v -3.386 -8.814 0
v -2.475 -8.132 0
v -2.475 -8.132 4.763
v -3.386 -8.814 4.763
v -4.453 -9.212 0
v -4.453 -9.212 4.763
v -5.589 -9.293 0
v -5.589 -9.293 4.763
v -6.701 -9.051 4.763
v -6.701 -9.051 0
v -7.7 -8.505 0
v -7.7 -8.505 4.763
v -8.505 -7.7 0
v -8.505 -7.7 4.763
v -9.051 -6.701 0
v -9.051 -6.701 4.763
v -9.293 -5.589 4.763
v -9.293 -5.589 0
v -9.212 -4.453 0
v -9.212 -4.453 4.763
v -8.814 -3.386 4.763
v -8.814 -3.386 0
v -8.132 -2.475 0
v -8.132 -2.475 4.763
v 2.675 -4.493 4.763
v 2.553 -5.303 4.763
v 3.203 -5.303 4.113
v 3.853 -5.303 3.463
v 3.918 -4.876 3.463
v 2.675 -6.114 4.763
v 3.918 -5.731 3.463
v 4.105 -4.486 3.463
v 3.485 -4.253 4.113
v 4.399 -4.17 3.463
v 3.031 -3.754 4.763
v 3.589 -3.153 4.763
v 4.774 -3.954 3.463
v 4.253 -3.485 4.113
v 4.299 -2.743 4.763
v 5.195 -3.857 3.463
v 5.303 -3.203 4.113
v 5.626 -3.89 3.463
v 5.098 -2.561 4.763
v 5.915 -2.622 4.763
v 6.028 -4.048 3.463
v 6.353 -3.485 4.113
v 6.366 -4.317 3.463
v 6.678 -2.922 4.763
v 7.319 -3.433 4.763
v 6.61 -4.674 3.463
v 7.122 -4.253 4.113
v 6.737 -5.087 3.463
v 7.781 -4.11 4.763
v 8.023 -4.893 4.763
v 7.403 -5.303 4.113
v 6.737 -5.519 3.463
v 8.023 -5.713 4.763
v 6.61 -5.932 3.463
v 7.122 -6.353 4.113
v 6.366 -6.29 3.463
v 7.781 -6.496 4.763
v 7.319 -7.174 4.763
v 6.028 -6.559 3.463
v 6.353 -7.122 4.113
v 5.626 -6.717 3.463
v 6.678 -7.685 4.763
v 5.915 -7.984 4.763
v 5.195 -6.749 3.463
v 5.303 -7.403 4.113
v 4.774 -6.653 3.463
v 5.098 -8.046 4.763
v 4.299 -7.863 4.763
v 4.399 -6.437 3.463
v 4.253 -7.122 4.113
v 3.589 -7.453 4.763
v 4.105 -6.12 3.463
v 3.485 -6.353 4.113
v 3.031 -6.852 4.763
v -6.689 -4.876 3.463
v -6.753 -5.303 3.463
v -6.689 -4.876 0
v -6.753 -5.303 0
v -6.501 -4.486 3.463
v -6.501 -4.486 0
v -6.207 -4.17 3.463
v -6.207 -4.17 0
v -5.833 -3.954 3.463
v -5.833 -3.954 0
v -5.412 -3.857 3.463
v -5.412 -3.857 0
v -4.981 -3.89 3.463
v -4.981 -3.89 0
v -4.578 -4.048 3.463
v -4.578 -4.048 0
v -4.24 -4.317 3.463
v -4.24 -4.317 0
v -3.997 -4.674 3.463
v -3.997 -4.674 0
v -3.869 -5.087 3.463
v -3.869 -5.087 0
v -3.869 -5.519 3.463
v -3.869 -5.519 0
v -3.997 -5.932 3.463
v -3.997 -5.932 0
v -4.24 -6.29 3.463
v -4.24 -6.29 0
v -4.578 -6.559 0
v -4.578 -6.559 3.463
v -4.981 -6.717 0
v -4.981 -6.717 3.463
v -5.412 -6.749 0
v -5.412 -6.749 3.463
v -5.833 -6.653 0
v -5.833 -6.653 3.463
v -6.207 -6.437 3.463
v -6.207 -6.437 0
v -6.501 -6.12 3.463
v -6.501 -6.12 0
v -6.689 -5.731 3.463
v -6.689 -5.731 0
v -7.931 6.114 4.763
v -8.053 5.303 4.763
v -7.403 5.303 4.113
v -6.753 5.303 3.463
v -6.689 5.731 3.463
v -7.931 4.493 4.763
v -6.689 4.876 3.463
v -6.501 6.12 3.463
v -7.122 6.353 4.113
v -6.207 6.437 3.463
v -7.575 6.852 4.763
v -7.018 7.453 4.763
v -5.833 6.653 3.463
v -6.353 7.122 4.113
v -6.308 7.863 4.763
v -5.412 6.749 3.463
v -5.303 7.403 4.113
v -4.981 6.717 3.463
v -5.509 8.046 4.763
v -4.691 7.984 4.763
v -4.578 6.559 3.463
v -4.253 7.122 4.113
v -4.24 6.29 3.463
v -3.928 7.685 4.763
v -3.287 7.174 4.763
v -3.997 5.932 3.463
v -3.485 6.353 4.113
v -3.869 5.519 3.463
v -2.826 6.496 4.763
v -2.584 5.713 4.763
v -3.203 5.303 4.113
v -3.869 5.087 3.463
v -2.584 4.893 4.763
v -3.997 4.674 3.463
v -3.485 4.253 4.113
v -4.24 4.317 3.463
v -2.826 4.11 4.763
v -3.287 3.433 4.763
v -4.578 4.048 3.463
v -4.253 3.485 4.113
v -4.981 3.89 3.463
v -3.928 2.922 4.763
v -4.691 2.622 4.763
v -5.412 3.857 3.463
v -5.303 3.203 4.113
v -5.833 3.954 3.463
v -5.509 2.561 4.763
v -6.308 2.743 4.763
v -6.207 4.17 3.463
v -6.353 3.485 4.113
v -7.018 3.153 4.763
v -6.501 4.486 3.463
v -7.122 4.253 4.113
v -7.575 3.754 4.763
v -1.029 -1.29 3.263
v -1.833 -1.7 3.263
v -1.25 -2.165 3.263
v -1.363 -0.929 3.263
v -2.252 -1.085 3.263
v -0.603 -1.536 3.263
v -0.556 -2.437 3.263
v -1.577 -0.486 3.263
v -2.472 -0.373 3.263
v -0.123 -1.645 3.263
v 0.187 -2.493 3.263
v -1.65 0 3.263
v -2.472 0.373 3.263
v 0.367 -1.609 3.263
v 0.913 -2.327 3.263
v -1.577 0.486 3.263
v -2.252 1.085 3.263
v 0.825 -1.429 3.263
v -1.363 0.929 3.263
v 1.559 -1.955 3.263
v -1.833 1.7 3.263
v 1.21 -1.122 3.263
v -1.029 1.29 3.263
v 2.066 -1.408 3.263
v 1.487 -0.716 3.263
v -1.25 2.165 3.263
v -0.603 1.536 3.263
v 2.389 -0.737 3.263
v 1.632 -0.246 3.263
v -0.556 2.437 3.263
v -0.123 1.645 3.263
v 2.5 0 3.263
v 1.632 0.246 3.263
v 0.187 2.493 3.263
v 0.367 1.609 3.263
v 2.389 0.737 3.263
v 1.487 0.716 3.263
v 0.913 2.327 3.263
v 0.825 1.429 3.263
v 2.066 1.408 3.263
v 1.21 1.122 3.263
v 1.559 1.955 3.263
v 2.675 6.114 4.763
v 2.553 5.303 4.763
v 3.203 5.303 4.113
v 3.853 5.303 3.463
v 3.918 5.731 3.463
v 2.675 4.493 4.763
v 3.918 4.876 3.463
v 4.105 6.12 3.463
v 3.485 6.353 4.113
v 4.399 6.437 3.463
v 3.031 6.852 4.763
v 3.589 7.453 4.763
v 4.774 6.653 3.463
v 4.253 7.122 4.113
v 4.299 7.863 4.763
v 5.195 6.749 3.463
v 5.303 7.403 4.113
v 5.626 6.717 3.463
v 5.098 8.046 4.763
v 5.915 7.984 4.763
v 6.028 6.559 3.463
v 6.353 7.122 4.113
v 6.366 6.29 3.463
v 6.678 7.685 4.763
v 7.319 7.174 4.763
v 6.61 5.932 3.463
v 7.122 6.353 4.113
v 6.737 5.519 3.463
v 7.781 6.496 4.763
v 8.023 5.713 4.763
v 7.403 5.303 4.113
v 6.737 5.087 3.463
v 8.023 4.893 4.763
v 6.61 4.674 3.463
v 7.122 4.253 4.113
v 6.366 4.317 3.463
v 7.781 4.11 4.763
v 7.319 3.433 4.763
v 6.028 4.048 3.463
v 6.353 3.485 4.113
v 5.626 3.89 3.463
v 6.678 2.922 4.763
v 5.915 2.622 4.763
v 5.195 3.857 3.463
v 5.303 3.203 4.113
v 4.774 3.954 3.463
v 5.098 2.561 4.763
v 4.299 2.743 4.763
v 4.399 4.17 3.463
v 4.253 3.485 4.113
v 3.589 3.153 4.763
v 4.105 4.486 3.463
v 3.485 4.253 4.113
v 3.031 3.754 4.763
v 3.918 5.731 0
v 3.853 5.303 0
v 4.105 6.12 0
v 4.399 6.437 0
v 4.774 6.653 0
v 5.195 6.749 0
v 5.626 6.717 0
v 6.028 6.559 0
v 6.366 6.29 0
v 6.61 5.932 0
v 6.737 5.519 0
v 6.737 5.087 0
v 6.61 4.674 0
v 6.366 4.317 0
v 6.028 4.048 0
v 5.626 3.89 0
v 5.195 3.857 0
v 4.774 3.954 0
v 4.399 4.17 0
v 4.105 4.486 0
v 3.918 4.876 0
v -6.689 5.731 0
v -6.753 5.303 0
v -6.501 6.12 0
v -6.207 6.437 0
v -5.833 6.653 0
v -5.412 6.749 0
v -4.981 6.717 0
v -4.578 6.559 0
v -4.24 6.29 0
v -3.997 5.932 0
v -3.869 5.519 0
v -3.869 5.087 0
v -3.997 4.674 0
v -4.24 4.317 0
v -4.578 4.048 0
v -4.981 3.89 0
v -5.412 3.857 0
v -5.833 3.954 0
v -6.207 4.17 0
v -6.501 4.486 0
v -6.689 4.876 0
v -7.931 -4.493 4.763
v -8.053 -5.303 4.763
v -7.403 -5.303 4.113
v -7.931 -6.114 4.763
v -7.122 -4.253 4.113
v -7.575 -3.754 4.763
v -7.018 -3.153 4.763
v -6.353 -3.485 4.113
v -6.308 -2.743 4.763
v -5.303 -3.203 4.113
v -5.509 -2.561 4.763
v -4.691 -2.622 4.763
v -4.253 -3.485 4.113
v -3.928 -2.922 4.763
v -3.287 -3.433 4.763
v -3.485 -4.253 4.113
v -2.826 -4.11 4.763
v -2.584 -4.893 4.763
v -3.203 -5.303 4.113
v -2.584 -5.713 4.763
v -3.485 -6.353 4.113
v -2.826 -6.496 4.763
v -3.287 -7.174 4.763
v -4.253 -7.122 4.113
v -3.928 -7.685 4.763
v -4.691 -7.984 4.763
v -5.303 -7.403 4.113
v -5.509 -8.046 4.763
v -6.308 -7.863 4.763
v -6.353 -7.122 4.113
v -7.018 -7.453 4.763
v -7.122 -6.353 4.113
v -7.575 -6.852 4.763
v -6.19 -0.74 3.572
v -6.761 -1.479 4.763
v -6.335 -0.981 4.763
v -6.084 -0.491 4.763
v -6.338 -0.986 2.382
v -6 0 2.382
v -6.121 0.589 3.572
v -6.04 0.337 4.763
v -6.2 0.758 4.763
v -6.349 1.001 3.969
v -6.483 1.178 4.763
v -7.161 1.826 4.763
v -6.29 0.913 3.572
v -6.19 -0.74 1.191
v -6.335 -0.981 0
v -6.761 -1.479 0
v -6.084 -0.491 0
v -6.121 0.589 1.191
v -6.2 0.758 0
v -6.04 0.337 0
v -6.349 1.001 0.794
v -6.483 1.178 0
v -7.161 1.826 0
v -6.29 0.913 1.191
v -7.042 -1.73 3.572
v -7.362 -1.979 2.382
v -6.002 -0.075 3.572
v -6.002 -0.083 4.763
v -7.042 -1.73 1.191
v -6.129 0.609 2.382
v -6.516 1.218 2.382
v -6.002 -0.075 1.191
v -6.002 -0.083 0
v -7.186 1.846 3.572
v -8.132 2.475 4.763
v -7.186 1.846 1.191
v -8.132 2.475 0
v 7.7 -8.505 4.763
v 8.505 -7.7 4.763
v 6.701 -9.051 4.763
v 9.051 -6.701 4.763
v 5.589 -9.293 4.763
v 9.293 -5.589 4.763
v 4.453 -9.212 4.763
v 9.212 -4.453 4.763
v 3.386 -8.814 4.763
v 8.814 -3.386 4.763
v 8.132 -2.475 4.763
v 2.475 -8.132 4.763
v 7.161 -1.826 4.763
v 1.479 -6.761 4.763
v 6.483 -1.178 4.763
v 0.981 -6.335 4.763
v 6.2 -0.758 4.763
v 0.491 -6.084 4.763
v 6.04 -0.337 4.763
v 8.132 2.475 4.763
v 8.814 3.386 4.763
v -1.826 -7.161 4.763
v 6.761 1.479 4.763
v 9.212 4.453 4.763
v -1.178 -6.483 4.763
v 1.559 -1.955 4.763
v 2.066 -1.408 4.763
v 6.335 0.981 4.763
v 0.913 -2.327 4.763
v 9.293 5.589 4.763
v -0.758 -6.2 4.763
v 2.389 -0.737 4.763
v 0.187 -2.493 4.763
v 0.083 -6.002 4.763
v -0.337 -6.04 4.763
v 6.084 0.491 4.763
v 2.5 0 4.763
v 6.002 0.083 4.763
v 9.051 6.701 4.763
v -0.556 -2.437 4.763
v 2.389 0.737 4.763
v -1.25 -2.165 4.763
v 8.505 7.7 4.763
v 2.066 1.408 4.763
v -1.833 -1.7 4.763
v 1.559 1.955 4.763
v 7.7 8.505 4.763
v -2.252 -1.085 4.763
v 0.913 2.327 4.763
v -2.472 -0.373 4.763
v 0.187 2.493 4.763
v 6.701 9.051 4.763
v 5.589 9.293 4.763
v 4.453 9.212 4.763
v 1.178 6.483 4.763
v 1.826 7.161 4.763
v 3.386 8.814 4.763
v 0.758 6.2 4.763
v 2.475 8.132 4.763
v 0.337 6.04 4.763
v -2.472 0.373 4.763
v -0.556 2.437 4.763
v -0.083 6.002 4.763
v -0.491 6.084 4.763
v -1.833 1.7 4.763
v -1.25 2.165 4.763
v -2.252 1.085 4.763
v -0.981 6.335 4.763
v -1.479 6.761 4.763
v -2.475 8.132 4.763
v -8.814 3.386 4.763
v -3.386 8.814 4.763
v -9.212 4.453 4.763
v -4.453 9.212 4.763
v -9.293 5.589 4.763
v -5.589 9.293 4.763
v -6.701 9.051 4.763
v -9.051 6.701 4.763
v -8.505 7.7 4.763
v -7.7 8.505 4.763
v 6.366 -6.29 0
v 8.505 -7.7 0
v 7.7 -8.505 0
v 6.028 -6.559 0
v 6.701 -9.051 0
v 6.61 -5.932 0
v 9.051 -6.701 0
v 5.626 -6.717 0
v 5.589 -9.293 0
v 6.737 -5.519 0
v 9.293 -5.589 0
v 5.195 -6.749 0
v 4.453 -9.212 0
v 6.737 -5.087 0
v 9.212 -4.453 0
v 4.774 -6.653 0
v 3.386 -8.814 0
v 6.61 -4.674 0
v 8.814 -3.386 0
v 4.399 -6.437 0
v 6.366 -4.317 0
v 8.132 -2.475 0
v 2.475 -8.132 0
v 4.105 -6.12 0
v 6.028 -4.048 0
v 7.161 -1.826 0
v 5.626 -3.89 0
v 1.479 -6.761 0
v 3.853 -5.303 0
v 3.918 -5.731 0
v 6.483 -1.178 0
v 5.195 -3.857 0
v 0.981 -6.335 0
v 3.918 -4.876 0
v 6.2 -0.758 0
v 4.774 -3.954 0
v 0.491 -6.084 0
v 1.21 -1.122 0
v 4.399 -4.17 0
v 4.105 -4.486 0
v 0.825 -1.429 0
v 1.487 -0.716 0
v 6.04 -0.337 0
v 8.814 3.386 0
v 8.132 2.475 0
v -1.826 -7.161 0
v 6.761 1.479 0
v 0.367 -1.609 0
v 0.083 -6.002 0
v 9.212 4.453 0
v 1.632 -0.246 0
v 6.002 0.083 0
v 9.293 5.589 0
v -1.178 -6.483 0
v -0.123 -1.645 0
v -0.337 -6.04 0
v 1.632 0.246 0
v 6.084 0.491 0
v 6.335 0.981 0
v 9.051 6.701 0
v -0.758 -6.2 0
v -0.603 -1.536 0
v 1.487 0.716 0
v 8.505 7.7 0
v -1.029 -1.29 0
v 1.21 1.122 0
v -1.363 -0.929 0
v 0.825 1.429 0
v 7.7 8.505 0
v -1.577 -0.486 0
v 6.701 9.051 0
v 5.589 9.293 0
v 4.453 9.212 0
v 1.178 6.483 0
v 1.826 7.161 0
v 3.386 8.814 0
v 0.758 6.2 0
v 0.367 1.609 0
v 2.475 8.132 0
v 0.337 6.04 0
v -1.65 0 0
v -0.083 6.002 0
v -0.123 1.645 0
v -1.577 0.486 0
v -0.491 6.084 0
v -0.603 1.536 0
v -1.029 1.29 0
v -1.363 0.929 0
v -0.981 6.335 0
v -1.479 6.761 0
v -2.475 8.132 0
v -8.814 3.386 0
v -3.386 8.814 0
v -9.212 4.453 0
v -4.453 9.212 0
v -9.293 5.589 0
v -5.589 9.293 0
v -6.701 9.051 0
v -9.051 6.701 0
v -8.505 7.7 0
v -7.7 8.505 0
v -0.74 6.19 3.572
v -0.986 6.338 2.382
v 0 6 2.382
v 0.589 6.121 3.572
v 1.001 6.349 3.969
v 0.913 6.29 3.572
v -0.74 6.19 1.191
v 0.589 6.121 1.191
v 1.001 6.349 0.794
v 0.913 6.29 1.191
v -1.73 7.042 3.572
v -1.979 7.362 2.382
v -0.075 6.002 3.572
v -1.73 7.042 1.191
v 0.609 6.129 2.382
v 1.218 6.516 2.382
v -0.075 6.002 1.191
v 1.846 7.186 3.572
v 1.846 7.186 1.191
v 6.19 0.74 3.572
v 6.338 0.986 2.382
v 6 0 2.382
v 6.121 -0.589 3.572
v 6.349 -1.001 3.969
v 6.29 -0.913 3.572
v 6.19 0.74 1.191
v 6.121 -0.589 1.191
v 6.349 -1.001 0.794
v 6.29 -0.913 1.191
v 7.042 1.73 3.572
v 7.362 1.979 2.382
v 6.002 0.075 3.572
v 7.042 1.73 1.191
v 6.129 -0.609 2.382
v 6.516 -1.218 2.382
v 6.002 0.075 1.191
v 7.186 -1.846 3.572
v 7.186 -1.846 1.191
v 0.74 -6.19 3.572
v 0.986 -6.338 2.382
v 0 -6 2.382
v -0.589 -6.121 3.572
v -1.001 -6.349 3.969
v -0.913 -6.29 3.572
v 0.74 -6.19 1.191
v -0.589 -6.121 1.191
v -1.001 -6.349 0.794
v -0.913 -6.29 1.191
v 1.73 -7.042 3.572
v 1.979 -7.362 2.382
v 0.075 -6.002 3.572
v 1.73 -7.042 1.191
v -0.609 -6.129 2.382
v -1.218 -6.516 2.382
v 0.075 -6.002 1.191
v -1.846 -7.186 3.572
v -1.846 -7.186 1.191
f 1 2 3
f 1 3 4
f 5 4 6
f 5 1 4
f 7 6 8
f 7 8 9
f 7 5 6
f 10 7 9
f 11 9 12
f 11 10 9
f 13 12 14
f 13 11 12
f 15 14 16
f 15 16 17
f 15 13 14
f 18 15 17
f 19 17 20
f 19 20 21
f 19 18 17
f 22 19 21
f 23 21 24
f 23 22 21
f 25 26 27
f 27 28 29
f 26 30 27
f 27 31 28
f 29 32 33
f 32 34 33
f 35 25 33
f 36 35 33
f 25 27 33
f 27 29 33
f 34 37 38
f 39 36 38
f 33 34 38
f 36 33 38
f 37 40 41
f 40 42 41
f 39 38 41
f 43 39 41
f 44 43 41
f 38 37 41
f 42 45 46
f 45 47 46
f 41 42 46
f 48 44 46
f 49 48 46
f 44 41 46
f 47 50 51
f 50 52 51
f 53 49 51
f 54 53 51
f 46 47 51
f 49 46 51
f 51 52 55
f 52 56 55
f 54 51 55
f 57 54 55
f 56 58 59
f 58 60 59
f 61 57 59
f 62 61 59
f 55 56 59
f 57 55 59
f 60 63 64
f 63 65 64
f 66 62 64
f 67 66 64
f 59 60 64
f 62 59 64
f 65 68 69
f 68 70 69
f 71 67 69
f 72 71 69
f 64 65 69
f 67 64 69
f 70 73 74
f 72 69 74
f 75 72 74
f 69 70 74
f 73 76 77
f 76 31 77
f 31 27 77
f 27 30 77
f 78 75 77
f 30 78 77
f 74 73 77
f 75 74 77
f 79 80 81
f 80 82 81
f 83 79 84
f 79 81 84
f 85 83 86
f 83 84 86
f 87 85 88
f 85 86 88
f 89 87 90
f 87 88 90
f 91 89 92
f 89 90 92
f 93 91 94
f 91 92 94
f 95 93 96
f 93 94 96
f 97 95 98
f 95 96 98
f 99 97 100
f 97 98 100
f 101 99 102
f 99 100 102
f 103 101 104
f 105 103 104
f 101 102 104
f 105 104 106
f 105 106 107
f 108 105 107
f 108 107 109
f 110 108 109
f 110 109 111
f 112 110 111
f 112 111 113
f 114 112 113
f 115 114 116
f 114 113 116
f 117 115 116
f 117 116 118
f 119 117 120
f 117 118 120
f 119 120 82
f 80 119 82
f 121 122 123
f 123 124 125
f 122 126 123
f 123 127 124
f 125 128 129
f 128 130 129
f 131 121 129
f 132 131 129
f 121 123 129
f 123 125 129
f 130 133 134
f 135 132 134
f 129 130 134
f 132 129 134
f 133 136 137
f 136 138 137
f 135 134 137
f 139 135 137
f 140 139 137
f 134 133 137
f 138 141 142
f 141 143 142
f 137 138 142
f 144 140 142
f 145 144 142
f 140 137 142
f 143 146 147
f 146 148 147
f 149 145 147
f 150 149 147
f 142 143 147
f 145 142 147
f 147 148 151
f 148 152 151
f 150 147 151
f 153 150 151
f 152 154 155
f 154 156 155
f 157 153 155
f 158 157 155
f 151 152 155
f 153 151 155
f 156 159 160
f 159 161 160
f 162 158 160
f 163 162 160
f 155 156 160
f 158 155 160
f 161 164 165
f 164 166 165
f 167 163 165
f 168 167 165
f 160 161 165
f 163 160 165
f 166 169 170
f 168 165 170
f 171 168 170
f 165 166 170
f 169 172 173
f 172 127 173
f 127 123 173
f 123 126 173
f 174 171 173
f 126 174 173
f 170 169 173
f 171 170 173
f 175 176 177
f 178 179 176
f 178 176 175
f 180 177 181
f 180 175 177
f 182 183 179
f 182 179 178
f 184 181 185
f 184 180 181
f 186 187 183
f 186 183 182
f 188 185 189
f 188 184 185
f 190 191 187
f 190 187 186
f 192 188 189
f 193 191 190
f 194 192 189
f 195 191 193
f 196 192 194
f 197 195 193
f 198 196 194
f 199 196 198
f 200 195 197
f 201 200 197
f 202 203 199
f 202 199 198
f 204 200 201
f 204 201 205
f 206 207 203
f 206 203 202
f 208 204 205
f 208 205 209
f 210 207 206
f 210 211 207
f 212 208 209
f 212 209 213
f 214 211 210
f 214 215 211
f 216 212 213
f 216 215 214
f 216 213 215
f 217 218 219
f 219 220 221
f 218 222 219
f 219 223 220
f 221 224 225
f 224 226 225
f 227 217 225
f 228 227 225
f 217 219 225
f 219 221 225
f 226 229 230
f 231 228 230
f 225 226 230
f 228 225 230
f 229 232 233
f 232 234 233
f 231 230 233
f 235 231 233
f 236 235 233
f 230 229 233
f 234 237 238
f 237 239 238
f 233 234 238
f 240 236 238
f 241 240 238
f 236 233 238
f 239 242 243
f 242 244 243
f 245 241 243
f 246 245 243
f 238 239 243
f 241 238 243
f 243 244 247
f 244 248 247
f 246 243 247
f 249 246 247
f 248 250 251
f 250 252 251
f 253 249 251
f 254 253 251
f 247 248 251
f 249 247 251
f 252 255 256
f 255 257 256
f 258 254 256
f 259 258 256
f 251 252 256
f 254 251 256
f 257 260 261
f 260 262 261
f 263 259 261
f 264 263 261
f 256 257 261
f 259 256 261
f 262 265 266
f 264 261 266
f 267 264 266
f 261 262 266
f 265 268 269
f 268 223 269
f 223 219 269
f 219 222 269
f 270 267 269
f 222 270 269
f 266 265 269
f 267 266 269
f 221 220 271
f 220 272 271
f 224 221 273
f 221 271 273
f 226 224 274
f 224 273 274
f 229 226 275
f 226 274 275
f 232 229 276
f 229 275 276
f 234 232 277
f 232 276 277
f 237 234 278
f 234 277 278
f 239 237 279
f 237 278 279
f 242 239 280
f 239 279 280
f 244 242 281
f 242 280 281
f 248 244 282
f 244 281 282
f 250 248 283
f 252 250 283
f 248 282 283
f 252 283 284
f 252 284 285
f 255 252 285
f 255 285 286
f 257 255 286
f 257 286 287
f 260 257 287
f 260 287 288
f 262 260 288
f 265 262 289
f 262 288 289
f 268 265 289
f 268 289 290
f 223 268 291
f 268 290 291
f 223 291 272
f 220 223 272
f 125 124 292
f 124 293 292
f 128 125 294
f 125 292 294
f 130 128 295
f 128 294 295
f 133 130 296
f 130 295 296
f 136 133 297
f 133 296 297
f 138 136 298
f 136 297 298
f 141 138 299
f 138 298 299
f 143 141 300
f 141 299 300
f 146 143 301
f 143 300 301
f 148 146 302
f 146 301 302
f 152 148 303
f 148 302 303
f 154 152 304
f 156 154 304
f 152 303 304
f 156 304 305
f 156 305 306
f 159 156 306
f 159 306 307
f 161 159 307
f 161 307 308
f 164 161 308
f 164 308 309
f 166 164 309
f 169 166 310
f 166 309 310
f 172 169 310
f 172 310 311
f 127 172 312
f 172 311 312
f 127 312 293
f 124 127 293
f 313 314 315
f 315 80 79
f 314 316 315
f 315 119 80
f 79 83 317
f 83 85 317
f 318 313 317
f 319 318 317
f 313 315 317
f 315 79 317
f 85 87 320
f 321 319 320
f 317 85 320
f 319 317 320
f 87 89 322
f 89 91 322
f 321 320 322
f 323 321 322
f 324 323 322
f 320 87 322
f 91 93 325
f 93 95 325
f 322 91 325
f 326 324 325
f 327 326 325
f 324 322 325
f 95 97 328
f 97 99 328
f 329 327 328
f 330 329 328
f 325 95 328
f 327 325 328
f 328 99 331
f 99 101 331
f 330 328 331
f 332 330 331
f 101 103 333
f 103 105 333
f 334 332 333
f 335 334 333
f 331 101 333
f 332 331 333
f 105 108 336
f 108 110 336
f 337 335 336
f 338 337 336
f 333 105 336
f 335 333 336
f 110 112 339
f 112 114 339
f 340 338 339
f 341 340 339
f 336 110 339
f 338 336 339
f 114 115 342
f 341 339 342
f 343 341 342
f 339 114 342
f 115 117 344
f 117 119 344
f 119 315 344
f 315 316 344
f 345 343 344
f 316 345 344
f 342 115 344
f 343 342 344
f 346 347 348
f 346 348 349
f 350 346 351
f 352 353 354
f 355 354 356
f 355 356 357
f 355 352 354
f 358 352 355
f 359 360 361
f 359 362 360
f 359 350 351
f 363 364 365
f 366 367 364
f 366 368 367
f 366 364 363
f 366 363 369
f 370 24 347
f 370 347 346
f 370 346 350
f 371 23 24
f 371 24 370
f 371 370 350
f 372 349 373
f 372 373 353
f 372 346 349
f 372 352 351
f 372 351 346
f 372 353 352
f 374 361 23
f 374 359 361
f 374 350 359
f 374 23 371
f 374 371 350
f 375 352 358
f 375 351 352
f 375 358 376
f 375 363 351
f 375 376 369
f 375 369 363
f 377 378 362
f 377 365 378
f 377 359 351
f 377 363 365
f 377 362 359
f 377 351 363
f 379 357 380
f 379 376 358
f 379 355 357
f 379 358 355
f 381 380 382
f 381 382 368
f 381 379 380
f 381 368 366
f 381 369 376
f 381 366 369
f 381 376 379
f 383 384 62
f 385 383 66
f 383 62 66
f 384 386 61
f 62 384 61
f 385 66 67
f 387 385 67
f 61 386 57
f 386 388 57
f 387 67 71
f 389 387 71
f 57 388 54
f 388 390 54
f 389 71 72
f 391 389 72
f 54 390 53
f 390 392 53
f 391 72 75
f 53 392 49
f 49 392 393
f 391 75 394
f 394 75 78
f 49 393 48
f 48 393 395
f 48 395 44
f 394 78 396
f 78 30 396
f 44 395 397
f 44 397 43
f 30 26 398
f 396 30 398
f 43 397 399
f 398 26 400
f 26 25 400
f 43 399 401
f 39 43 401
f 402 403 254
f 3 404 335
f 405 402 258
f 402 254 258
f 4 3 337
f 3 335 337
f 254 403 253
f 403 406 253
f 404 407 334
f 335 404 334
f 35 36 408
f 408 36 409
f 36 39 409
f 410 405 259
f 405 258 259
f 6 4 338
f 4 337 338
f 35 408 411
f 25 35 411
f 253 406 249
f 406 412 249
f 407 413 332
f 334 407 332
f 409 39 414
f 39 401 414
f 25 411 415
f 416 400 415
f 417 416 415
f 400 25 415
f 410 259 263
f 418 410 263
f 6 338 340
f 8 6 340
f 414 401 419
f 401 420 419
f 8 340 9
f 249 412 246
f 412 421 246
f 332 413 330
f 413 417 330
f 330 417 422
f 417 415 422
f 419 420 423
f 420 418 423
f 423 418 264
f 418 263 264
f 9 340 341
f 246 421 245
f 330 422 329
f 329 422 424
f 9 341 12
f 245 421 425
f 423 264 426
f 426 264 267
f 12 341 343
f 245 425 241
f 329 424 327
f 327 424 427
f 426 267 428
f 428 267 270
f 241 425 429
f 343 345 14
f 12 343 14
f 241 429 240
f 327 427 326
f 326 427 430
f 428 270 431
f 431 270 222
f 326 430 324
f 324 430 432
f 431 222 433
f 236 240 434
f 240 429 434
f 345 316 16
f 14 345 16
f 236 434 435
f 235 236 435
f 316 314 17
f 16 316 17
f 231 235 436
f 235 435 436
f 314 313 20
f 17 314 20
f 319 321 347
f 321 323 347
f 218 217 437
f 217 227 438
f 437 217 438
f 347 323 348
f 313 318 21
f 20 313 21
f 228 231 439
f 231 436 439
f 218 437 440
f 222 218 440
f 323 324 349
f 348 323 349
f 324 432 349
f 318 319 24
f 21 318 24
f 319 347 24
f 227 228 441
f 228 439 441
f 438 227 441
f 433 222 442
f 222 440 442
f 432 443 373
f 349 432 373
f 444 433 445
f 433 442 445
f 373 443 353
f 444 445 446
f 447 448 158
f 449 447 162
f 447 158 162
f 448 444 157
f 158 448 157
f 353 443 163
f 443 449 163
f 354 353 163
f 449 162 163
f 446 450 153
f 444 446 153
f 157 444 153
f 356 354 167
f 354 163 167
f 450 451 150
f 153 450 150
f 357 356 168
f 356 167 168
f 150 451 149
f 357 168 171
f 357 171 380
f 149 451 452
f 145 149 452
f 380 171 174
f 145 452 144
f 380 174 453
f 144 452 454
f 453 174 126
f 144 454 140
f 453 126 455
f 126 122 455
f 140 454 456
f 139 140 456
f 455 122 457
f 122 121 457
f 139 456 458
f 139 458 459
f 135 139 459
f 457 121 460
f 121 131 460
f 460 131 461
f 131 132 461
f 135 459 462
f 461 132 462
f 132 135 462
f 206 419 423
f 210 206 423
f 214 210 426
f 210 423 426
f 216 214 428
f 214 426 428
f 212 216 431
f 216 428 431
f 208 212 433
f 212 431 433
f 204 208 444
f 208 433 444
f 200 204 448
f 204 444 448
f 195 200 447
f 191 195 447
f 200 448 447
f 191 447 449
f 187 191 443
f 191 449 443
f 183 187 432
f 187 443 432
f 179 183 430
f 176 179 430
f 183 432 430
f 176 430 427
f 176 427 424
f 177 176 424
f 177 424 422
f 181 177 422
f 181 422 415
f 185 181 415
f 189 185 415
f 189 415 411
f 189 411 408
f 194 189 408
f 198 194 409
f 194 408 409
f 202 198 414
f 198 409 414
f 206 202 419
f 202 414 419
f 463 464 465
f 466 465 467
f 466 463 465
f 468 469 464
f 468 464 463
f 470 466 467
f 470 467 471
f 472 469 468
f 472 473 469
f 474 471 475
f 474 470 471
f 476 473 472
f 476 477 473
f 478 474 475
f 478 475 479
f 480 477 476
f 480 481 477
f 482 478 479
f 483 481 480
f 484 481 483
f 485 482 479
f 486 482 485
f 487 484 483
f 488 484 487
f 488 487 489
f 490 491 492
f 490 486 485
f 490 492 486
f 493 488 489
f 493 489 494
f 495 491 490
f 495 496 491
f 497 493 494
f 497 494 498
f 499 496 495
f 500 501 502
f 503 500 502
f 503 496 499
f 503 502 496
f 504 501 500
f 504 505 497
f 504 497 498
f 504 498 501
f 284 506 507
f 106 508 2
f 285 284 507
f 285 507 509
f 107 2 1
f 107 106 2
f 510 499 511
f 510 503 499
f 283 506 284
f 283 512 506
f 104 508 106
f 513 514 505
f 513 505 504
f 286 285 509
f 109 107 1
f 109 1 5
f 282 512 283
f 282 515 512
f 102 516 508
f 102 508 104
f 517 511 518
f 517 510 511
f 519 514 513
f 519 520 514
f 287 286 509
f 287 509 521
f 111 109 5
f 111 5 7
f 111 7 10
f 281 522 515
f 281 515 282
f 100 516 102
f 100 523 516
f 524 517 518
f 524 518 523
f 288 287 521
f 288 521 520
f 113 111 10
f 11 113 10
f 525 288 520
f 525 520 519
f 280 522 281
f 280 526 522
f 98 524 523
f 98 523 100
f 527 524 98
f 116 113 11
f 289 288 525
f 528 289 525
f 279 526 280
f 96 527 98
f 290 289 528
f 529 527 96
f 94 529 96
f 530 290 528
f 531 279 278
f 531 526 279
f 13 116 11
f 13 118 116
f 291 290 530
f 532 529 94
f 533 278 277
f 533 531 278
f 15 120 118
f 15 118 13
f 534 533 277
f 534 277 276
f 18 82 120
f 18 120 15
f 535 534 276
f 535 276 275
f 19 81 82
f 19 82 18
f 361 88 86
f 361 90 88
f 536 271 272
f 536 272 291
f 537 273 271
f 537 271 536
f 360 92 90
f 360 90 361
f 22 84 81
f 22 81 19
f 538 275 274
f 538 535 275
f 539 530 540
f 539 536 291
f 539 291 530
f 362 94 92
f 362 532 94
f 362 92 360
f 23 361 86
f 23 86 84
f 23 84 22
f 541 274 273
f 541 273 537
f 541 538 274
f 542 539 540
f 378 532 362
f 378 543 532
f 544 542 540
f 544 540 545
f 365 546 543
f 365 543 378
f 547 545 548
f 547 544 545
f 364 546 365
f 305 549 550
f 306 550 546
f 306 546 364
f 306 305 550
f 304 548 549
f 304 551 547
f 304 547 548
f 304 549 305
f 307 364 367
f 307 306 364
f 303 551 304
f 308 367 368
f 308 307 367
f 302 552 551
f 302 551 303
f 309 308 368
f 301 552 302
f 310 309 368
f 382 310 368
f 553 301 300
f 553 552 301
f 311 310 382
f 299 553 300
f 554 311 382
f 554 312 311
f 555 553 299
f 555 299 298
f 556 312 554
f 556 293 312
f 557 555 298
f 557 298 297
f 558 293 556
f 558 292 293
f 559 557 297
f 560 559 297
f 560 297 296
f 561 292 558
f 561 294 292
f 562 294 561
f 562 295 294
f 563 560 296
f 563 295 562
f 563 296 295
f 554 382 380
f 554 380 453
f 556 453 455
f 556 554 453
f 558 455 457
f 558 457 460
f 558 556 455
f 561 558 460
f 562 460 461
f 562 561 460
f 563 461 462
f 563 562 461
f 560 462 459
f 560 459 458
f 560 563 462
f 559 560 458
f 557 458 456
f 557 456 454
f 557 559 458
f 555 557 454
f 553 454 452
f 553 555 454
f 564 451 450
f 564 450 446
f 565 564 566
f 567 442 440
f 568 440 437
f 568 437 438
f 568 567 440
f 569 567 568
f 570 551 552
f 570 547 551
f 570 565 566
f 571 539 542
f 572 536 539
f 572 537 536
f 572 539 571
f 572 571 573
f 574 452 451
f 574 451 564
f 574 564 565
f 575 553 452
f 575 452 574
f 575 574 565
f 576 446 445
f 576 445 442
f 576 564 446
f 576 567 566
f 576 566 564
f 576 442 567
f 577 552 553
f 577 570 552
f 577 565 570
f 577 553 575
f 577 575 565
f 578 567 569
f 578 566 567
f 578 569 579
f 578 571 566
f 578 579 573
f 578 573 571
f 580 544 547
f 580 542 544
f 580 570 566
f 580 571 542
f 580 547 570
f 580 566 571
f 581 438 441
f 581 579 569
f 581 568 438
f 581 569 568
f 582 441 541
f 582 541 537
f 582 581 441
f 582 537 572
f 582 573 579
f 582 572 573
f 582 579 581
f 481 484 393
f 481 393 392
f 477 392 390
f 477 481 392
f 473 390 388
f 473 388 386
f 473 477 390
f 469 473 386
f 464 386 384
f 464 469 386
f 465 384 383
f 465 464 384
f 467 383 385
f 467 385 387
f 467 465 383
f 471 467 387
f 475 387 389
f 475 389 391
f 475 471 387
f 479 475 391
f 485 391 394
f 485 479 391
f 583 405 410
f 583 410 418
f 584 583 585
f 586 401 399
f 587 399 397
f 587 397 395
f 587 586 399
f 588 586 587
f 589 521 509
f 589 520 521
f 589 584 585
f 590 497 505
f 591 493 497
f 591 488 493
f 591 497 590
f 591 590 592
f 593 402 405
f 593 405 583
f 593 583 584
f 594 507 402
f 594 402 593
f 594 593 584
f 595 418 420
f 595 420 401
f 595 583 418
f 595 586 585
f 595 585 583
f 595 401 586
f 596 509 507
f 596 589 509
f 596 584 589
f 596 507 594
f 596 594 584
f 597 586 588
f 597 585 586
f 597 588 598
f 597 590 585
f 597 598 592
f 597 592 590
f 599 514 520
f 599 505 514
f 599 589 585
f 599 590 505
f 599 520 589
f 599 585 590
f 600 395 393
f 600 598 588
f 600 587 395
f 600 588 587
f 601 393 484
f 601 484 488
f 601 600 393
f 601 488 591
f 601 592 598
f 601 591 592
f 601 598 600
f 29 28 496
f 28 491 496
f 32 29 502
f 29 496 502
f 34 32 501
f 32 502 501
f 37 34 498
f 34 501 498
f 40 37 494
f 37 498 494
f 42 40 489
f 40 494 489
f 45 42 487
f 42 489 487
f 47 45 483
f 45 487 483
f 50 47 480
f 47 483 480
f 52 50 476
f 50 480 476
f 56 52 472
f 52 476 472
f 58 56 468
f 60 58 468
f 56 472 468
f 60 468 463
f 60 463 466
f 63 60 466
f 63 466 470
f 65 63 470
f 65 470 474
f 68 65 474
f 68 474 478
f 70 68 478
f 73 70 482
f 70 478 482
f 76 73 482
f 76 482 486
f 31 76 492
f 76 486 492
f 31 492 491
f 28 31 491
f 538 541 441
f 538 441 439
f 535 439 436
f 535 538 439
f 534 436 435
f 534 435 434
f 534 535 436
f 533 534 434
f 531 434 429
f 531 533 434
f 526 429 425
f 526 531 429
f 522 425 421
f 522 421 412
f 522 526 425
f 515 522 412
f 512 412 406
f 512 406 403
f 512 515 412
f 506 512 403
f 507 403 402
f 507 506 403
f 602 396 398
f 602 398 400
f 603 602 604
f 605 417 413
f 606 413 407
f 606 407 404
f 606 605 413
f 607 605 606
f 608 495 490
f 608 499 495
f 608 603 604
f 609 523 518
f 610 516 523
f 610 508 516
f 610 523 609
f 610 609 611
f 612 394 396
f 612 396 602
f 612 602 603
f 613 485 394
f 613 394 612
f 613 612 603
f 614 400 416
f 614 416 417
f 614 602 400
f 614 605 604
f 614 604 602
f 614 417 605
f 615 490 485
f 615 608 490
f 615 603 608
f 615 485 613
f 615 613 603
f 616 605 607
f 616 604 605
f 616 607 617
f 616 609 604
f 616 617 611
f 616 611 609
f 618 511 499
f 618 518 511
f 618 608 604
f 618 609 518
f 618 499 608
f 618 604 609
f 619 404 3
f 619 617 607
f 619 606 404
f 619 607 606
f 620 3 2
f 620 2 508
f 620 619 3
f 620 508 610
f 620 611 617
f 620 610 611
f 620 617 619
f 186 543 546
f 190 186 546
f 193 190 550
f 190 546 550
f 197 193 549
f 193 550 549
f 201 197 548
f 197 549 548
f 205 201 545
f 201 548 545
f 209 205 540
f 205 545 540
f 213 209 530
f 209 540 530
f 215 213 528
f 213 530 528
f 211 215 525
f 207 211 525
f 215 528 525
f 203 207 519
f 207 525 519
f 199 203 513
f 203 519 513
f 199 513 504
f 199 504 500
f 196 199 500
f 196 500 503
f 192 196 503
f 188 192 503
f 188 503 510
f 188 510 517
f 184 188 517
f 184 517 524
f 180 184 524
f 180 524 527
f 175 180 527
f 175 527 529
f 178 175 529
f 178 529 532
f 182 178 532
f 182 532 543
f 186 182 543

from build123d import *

# Parameters (mm, degrees)
BOSS_EXTRUDE1_DEPTH                               = 4.763
CSK_FOR_M2_5_FLAT_HEAD_MACHINE_SCREW1_D           = 2.9
CSK_FOR_M2_5_FLAT_HEAD_MACHINE_SCREW1_CSINK_D     = 5.5
CSK_FOR_M2_5_FLAT_HEAD_MACHINE_SCREW1_CSINK_ANGLE = 90
TAP_DRILL_FOR_M4X0_7_TAP1_D                       = 3.3
SKETCH8_R                                         = 2.5
CUT_EXTRUDE1_DEPTH                                = 1.5


with BuildPart() as part:
    # Sketch1 → Boss-Extrude1 (new body)
    with BuildSketch(Plane.XY):
        with BuildLine():
            ThreePointArc((-8.131727984, 2.474873734), (-8.131727984, 8.131727984), (-2.474873734, 8.131727984))
            add(Edge.make_bspline(
                [(-2.474873734, 8.131727984), (0, 3.868272016), (2.474873734, 8.131727984)],
                knots=[0, 0, 0, 1, 1, 1], degree=2))
            ThreePointArc((2.474873734, 8.131727984), (8.131727984, 8.131727984), (8.131727984, 2.474873734))
            add(Edge.make_bspline(
                [(8.131727984, 2.474873734), (3.868272016, 0), (8.131727984, -2.474873734)],
                knots=[0, 0, 0, 1, 1, 1], degree=2))
            ThreePointArc((8.131727984, -2.474873734), (8.131727984, -8.131727984), (2.474873734, -8.131727984))
            add(Edge.make_bspline(
                [(2.474873734, -8.131727984), (0, -3.868272016), (-2.474873734, -8.131727984)],
                knots=[0, 0, 0, 1, 1, 1], degree=2))
            ThreePointArc((-2.474873734, -8.131727984), (-8.131727984, -8.131727984), (-8.131727984, -2.474873734))
            add(Edge.make_bspline(
                [(-8.131727984, -2.474873734), (-3.868272016, 0), (-8.131727984, 2.474873734)],
                knots=[0, 0, 0, 1, 1, 1], degree=2))
        make_face()
    extrude(amount=BOSS_EXTRUDE1_DEPTH)

    # CSK for M2.5 Flat Head Machine Screw1 (through all)
    with Locations(Plane.XY.offset(4.763)):
        with Locations((-5.303300859, 5.303300859), (5.303300859, 5.303300859), (5.303300859, -5.303300859), (-5.303300859, -5.303300859)):
            CounterSinkHole(CSK_FOR_M2_5_FLAT_HEAD_MACHINE_SCREW1_D / 2, CSK_FOR_M2_5_FLAT_HEAD_MACHINE_SCREW1_CSINK_D / 2, counter_sink_angle=CSK_FOR_M2_5_FLAT_HEAD_MACHINE_SCREW1_CSINK_ANGLE)

    # Tap Drill for M4x0.7 Tap1 (through all)
    with Locations(Plane.XY.offset(4.763)):
        with Locations((0, 0)):
            Hole(TAP_DRILL_FOR_M4X0_7_TAP1_D / 2)

    # Sketch8 → Cut-Extrude1 (cut)
    with BuildSketch(Plane.XY.offset(4.763)):
        Circle(SKETCH8_R)
    extrude(amount=-CUT_EXTRUDE1_DEPTH, mode=Mode.SUBTRACT)


solid = part.part
